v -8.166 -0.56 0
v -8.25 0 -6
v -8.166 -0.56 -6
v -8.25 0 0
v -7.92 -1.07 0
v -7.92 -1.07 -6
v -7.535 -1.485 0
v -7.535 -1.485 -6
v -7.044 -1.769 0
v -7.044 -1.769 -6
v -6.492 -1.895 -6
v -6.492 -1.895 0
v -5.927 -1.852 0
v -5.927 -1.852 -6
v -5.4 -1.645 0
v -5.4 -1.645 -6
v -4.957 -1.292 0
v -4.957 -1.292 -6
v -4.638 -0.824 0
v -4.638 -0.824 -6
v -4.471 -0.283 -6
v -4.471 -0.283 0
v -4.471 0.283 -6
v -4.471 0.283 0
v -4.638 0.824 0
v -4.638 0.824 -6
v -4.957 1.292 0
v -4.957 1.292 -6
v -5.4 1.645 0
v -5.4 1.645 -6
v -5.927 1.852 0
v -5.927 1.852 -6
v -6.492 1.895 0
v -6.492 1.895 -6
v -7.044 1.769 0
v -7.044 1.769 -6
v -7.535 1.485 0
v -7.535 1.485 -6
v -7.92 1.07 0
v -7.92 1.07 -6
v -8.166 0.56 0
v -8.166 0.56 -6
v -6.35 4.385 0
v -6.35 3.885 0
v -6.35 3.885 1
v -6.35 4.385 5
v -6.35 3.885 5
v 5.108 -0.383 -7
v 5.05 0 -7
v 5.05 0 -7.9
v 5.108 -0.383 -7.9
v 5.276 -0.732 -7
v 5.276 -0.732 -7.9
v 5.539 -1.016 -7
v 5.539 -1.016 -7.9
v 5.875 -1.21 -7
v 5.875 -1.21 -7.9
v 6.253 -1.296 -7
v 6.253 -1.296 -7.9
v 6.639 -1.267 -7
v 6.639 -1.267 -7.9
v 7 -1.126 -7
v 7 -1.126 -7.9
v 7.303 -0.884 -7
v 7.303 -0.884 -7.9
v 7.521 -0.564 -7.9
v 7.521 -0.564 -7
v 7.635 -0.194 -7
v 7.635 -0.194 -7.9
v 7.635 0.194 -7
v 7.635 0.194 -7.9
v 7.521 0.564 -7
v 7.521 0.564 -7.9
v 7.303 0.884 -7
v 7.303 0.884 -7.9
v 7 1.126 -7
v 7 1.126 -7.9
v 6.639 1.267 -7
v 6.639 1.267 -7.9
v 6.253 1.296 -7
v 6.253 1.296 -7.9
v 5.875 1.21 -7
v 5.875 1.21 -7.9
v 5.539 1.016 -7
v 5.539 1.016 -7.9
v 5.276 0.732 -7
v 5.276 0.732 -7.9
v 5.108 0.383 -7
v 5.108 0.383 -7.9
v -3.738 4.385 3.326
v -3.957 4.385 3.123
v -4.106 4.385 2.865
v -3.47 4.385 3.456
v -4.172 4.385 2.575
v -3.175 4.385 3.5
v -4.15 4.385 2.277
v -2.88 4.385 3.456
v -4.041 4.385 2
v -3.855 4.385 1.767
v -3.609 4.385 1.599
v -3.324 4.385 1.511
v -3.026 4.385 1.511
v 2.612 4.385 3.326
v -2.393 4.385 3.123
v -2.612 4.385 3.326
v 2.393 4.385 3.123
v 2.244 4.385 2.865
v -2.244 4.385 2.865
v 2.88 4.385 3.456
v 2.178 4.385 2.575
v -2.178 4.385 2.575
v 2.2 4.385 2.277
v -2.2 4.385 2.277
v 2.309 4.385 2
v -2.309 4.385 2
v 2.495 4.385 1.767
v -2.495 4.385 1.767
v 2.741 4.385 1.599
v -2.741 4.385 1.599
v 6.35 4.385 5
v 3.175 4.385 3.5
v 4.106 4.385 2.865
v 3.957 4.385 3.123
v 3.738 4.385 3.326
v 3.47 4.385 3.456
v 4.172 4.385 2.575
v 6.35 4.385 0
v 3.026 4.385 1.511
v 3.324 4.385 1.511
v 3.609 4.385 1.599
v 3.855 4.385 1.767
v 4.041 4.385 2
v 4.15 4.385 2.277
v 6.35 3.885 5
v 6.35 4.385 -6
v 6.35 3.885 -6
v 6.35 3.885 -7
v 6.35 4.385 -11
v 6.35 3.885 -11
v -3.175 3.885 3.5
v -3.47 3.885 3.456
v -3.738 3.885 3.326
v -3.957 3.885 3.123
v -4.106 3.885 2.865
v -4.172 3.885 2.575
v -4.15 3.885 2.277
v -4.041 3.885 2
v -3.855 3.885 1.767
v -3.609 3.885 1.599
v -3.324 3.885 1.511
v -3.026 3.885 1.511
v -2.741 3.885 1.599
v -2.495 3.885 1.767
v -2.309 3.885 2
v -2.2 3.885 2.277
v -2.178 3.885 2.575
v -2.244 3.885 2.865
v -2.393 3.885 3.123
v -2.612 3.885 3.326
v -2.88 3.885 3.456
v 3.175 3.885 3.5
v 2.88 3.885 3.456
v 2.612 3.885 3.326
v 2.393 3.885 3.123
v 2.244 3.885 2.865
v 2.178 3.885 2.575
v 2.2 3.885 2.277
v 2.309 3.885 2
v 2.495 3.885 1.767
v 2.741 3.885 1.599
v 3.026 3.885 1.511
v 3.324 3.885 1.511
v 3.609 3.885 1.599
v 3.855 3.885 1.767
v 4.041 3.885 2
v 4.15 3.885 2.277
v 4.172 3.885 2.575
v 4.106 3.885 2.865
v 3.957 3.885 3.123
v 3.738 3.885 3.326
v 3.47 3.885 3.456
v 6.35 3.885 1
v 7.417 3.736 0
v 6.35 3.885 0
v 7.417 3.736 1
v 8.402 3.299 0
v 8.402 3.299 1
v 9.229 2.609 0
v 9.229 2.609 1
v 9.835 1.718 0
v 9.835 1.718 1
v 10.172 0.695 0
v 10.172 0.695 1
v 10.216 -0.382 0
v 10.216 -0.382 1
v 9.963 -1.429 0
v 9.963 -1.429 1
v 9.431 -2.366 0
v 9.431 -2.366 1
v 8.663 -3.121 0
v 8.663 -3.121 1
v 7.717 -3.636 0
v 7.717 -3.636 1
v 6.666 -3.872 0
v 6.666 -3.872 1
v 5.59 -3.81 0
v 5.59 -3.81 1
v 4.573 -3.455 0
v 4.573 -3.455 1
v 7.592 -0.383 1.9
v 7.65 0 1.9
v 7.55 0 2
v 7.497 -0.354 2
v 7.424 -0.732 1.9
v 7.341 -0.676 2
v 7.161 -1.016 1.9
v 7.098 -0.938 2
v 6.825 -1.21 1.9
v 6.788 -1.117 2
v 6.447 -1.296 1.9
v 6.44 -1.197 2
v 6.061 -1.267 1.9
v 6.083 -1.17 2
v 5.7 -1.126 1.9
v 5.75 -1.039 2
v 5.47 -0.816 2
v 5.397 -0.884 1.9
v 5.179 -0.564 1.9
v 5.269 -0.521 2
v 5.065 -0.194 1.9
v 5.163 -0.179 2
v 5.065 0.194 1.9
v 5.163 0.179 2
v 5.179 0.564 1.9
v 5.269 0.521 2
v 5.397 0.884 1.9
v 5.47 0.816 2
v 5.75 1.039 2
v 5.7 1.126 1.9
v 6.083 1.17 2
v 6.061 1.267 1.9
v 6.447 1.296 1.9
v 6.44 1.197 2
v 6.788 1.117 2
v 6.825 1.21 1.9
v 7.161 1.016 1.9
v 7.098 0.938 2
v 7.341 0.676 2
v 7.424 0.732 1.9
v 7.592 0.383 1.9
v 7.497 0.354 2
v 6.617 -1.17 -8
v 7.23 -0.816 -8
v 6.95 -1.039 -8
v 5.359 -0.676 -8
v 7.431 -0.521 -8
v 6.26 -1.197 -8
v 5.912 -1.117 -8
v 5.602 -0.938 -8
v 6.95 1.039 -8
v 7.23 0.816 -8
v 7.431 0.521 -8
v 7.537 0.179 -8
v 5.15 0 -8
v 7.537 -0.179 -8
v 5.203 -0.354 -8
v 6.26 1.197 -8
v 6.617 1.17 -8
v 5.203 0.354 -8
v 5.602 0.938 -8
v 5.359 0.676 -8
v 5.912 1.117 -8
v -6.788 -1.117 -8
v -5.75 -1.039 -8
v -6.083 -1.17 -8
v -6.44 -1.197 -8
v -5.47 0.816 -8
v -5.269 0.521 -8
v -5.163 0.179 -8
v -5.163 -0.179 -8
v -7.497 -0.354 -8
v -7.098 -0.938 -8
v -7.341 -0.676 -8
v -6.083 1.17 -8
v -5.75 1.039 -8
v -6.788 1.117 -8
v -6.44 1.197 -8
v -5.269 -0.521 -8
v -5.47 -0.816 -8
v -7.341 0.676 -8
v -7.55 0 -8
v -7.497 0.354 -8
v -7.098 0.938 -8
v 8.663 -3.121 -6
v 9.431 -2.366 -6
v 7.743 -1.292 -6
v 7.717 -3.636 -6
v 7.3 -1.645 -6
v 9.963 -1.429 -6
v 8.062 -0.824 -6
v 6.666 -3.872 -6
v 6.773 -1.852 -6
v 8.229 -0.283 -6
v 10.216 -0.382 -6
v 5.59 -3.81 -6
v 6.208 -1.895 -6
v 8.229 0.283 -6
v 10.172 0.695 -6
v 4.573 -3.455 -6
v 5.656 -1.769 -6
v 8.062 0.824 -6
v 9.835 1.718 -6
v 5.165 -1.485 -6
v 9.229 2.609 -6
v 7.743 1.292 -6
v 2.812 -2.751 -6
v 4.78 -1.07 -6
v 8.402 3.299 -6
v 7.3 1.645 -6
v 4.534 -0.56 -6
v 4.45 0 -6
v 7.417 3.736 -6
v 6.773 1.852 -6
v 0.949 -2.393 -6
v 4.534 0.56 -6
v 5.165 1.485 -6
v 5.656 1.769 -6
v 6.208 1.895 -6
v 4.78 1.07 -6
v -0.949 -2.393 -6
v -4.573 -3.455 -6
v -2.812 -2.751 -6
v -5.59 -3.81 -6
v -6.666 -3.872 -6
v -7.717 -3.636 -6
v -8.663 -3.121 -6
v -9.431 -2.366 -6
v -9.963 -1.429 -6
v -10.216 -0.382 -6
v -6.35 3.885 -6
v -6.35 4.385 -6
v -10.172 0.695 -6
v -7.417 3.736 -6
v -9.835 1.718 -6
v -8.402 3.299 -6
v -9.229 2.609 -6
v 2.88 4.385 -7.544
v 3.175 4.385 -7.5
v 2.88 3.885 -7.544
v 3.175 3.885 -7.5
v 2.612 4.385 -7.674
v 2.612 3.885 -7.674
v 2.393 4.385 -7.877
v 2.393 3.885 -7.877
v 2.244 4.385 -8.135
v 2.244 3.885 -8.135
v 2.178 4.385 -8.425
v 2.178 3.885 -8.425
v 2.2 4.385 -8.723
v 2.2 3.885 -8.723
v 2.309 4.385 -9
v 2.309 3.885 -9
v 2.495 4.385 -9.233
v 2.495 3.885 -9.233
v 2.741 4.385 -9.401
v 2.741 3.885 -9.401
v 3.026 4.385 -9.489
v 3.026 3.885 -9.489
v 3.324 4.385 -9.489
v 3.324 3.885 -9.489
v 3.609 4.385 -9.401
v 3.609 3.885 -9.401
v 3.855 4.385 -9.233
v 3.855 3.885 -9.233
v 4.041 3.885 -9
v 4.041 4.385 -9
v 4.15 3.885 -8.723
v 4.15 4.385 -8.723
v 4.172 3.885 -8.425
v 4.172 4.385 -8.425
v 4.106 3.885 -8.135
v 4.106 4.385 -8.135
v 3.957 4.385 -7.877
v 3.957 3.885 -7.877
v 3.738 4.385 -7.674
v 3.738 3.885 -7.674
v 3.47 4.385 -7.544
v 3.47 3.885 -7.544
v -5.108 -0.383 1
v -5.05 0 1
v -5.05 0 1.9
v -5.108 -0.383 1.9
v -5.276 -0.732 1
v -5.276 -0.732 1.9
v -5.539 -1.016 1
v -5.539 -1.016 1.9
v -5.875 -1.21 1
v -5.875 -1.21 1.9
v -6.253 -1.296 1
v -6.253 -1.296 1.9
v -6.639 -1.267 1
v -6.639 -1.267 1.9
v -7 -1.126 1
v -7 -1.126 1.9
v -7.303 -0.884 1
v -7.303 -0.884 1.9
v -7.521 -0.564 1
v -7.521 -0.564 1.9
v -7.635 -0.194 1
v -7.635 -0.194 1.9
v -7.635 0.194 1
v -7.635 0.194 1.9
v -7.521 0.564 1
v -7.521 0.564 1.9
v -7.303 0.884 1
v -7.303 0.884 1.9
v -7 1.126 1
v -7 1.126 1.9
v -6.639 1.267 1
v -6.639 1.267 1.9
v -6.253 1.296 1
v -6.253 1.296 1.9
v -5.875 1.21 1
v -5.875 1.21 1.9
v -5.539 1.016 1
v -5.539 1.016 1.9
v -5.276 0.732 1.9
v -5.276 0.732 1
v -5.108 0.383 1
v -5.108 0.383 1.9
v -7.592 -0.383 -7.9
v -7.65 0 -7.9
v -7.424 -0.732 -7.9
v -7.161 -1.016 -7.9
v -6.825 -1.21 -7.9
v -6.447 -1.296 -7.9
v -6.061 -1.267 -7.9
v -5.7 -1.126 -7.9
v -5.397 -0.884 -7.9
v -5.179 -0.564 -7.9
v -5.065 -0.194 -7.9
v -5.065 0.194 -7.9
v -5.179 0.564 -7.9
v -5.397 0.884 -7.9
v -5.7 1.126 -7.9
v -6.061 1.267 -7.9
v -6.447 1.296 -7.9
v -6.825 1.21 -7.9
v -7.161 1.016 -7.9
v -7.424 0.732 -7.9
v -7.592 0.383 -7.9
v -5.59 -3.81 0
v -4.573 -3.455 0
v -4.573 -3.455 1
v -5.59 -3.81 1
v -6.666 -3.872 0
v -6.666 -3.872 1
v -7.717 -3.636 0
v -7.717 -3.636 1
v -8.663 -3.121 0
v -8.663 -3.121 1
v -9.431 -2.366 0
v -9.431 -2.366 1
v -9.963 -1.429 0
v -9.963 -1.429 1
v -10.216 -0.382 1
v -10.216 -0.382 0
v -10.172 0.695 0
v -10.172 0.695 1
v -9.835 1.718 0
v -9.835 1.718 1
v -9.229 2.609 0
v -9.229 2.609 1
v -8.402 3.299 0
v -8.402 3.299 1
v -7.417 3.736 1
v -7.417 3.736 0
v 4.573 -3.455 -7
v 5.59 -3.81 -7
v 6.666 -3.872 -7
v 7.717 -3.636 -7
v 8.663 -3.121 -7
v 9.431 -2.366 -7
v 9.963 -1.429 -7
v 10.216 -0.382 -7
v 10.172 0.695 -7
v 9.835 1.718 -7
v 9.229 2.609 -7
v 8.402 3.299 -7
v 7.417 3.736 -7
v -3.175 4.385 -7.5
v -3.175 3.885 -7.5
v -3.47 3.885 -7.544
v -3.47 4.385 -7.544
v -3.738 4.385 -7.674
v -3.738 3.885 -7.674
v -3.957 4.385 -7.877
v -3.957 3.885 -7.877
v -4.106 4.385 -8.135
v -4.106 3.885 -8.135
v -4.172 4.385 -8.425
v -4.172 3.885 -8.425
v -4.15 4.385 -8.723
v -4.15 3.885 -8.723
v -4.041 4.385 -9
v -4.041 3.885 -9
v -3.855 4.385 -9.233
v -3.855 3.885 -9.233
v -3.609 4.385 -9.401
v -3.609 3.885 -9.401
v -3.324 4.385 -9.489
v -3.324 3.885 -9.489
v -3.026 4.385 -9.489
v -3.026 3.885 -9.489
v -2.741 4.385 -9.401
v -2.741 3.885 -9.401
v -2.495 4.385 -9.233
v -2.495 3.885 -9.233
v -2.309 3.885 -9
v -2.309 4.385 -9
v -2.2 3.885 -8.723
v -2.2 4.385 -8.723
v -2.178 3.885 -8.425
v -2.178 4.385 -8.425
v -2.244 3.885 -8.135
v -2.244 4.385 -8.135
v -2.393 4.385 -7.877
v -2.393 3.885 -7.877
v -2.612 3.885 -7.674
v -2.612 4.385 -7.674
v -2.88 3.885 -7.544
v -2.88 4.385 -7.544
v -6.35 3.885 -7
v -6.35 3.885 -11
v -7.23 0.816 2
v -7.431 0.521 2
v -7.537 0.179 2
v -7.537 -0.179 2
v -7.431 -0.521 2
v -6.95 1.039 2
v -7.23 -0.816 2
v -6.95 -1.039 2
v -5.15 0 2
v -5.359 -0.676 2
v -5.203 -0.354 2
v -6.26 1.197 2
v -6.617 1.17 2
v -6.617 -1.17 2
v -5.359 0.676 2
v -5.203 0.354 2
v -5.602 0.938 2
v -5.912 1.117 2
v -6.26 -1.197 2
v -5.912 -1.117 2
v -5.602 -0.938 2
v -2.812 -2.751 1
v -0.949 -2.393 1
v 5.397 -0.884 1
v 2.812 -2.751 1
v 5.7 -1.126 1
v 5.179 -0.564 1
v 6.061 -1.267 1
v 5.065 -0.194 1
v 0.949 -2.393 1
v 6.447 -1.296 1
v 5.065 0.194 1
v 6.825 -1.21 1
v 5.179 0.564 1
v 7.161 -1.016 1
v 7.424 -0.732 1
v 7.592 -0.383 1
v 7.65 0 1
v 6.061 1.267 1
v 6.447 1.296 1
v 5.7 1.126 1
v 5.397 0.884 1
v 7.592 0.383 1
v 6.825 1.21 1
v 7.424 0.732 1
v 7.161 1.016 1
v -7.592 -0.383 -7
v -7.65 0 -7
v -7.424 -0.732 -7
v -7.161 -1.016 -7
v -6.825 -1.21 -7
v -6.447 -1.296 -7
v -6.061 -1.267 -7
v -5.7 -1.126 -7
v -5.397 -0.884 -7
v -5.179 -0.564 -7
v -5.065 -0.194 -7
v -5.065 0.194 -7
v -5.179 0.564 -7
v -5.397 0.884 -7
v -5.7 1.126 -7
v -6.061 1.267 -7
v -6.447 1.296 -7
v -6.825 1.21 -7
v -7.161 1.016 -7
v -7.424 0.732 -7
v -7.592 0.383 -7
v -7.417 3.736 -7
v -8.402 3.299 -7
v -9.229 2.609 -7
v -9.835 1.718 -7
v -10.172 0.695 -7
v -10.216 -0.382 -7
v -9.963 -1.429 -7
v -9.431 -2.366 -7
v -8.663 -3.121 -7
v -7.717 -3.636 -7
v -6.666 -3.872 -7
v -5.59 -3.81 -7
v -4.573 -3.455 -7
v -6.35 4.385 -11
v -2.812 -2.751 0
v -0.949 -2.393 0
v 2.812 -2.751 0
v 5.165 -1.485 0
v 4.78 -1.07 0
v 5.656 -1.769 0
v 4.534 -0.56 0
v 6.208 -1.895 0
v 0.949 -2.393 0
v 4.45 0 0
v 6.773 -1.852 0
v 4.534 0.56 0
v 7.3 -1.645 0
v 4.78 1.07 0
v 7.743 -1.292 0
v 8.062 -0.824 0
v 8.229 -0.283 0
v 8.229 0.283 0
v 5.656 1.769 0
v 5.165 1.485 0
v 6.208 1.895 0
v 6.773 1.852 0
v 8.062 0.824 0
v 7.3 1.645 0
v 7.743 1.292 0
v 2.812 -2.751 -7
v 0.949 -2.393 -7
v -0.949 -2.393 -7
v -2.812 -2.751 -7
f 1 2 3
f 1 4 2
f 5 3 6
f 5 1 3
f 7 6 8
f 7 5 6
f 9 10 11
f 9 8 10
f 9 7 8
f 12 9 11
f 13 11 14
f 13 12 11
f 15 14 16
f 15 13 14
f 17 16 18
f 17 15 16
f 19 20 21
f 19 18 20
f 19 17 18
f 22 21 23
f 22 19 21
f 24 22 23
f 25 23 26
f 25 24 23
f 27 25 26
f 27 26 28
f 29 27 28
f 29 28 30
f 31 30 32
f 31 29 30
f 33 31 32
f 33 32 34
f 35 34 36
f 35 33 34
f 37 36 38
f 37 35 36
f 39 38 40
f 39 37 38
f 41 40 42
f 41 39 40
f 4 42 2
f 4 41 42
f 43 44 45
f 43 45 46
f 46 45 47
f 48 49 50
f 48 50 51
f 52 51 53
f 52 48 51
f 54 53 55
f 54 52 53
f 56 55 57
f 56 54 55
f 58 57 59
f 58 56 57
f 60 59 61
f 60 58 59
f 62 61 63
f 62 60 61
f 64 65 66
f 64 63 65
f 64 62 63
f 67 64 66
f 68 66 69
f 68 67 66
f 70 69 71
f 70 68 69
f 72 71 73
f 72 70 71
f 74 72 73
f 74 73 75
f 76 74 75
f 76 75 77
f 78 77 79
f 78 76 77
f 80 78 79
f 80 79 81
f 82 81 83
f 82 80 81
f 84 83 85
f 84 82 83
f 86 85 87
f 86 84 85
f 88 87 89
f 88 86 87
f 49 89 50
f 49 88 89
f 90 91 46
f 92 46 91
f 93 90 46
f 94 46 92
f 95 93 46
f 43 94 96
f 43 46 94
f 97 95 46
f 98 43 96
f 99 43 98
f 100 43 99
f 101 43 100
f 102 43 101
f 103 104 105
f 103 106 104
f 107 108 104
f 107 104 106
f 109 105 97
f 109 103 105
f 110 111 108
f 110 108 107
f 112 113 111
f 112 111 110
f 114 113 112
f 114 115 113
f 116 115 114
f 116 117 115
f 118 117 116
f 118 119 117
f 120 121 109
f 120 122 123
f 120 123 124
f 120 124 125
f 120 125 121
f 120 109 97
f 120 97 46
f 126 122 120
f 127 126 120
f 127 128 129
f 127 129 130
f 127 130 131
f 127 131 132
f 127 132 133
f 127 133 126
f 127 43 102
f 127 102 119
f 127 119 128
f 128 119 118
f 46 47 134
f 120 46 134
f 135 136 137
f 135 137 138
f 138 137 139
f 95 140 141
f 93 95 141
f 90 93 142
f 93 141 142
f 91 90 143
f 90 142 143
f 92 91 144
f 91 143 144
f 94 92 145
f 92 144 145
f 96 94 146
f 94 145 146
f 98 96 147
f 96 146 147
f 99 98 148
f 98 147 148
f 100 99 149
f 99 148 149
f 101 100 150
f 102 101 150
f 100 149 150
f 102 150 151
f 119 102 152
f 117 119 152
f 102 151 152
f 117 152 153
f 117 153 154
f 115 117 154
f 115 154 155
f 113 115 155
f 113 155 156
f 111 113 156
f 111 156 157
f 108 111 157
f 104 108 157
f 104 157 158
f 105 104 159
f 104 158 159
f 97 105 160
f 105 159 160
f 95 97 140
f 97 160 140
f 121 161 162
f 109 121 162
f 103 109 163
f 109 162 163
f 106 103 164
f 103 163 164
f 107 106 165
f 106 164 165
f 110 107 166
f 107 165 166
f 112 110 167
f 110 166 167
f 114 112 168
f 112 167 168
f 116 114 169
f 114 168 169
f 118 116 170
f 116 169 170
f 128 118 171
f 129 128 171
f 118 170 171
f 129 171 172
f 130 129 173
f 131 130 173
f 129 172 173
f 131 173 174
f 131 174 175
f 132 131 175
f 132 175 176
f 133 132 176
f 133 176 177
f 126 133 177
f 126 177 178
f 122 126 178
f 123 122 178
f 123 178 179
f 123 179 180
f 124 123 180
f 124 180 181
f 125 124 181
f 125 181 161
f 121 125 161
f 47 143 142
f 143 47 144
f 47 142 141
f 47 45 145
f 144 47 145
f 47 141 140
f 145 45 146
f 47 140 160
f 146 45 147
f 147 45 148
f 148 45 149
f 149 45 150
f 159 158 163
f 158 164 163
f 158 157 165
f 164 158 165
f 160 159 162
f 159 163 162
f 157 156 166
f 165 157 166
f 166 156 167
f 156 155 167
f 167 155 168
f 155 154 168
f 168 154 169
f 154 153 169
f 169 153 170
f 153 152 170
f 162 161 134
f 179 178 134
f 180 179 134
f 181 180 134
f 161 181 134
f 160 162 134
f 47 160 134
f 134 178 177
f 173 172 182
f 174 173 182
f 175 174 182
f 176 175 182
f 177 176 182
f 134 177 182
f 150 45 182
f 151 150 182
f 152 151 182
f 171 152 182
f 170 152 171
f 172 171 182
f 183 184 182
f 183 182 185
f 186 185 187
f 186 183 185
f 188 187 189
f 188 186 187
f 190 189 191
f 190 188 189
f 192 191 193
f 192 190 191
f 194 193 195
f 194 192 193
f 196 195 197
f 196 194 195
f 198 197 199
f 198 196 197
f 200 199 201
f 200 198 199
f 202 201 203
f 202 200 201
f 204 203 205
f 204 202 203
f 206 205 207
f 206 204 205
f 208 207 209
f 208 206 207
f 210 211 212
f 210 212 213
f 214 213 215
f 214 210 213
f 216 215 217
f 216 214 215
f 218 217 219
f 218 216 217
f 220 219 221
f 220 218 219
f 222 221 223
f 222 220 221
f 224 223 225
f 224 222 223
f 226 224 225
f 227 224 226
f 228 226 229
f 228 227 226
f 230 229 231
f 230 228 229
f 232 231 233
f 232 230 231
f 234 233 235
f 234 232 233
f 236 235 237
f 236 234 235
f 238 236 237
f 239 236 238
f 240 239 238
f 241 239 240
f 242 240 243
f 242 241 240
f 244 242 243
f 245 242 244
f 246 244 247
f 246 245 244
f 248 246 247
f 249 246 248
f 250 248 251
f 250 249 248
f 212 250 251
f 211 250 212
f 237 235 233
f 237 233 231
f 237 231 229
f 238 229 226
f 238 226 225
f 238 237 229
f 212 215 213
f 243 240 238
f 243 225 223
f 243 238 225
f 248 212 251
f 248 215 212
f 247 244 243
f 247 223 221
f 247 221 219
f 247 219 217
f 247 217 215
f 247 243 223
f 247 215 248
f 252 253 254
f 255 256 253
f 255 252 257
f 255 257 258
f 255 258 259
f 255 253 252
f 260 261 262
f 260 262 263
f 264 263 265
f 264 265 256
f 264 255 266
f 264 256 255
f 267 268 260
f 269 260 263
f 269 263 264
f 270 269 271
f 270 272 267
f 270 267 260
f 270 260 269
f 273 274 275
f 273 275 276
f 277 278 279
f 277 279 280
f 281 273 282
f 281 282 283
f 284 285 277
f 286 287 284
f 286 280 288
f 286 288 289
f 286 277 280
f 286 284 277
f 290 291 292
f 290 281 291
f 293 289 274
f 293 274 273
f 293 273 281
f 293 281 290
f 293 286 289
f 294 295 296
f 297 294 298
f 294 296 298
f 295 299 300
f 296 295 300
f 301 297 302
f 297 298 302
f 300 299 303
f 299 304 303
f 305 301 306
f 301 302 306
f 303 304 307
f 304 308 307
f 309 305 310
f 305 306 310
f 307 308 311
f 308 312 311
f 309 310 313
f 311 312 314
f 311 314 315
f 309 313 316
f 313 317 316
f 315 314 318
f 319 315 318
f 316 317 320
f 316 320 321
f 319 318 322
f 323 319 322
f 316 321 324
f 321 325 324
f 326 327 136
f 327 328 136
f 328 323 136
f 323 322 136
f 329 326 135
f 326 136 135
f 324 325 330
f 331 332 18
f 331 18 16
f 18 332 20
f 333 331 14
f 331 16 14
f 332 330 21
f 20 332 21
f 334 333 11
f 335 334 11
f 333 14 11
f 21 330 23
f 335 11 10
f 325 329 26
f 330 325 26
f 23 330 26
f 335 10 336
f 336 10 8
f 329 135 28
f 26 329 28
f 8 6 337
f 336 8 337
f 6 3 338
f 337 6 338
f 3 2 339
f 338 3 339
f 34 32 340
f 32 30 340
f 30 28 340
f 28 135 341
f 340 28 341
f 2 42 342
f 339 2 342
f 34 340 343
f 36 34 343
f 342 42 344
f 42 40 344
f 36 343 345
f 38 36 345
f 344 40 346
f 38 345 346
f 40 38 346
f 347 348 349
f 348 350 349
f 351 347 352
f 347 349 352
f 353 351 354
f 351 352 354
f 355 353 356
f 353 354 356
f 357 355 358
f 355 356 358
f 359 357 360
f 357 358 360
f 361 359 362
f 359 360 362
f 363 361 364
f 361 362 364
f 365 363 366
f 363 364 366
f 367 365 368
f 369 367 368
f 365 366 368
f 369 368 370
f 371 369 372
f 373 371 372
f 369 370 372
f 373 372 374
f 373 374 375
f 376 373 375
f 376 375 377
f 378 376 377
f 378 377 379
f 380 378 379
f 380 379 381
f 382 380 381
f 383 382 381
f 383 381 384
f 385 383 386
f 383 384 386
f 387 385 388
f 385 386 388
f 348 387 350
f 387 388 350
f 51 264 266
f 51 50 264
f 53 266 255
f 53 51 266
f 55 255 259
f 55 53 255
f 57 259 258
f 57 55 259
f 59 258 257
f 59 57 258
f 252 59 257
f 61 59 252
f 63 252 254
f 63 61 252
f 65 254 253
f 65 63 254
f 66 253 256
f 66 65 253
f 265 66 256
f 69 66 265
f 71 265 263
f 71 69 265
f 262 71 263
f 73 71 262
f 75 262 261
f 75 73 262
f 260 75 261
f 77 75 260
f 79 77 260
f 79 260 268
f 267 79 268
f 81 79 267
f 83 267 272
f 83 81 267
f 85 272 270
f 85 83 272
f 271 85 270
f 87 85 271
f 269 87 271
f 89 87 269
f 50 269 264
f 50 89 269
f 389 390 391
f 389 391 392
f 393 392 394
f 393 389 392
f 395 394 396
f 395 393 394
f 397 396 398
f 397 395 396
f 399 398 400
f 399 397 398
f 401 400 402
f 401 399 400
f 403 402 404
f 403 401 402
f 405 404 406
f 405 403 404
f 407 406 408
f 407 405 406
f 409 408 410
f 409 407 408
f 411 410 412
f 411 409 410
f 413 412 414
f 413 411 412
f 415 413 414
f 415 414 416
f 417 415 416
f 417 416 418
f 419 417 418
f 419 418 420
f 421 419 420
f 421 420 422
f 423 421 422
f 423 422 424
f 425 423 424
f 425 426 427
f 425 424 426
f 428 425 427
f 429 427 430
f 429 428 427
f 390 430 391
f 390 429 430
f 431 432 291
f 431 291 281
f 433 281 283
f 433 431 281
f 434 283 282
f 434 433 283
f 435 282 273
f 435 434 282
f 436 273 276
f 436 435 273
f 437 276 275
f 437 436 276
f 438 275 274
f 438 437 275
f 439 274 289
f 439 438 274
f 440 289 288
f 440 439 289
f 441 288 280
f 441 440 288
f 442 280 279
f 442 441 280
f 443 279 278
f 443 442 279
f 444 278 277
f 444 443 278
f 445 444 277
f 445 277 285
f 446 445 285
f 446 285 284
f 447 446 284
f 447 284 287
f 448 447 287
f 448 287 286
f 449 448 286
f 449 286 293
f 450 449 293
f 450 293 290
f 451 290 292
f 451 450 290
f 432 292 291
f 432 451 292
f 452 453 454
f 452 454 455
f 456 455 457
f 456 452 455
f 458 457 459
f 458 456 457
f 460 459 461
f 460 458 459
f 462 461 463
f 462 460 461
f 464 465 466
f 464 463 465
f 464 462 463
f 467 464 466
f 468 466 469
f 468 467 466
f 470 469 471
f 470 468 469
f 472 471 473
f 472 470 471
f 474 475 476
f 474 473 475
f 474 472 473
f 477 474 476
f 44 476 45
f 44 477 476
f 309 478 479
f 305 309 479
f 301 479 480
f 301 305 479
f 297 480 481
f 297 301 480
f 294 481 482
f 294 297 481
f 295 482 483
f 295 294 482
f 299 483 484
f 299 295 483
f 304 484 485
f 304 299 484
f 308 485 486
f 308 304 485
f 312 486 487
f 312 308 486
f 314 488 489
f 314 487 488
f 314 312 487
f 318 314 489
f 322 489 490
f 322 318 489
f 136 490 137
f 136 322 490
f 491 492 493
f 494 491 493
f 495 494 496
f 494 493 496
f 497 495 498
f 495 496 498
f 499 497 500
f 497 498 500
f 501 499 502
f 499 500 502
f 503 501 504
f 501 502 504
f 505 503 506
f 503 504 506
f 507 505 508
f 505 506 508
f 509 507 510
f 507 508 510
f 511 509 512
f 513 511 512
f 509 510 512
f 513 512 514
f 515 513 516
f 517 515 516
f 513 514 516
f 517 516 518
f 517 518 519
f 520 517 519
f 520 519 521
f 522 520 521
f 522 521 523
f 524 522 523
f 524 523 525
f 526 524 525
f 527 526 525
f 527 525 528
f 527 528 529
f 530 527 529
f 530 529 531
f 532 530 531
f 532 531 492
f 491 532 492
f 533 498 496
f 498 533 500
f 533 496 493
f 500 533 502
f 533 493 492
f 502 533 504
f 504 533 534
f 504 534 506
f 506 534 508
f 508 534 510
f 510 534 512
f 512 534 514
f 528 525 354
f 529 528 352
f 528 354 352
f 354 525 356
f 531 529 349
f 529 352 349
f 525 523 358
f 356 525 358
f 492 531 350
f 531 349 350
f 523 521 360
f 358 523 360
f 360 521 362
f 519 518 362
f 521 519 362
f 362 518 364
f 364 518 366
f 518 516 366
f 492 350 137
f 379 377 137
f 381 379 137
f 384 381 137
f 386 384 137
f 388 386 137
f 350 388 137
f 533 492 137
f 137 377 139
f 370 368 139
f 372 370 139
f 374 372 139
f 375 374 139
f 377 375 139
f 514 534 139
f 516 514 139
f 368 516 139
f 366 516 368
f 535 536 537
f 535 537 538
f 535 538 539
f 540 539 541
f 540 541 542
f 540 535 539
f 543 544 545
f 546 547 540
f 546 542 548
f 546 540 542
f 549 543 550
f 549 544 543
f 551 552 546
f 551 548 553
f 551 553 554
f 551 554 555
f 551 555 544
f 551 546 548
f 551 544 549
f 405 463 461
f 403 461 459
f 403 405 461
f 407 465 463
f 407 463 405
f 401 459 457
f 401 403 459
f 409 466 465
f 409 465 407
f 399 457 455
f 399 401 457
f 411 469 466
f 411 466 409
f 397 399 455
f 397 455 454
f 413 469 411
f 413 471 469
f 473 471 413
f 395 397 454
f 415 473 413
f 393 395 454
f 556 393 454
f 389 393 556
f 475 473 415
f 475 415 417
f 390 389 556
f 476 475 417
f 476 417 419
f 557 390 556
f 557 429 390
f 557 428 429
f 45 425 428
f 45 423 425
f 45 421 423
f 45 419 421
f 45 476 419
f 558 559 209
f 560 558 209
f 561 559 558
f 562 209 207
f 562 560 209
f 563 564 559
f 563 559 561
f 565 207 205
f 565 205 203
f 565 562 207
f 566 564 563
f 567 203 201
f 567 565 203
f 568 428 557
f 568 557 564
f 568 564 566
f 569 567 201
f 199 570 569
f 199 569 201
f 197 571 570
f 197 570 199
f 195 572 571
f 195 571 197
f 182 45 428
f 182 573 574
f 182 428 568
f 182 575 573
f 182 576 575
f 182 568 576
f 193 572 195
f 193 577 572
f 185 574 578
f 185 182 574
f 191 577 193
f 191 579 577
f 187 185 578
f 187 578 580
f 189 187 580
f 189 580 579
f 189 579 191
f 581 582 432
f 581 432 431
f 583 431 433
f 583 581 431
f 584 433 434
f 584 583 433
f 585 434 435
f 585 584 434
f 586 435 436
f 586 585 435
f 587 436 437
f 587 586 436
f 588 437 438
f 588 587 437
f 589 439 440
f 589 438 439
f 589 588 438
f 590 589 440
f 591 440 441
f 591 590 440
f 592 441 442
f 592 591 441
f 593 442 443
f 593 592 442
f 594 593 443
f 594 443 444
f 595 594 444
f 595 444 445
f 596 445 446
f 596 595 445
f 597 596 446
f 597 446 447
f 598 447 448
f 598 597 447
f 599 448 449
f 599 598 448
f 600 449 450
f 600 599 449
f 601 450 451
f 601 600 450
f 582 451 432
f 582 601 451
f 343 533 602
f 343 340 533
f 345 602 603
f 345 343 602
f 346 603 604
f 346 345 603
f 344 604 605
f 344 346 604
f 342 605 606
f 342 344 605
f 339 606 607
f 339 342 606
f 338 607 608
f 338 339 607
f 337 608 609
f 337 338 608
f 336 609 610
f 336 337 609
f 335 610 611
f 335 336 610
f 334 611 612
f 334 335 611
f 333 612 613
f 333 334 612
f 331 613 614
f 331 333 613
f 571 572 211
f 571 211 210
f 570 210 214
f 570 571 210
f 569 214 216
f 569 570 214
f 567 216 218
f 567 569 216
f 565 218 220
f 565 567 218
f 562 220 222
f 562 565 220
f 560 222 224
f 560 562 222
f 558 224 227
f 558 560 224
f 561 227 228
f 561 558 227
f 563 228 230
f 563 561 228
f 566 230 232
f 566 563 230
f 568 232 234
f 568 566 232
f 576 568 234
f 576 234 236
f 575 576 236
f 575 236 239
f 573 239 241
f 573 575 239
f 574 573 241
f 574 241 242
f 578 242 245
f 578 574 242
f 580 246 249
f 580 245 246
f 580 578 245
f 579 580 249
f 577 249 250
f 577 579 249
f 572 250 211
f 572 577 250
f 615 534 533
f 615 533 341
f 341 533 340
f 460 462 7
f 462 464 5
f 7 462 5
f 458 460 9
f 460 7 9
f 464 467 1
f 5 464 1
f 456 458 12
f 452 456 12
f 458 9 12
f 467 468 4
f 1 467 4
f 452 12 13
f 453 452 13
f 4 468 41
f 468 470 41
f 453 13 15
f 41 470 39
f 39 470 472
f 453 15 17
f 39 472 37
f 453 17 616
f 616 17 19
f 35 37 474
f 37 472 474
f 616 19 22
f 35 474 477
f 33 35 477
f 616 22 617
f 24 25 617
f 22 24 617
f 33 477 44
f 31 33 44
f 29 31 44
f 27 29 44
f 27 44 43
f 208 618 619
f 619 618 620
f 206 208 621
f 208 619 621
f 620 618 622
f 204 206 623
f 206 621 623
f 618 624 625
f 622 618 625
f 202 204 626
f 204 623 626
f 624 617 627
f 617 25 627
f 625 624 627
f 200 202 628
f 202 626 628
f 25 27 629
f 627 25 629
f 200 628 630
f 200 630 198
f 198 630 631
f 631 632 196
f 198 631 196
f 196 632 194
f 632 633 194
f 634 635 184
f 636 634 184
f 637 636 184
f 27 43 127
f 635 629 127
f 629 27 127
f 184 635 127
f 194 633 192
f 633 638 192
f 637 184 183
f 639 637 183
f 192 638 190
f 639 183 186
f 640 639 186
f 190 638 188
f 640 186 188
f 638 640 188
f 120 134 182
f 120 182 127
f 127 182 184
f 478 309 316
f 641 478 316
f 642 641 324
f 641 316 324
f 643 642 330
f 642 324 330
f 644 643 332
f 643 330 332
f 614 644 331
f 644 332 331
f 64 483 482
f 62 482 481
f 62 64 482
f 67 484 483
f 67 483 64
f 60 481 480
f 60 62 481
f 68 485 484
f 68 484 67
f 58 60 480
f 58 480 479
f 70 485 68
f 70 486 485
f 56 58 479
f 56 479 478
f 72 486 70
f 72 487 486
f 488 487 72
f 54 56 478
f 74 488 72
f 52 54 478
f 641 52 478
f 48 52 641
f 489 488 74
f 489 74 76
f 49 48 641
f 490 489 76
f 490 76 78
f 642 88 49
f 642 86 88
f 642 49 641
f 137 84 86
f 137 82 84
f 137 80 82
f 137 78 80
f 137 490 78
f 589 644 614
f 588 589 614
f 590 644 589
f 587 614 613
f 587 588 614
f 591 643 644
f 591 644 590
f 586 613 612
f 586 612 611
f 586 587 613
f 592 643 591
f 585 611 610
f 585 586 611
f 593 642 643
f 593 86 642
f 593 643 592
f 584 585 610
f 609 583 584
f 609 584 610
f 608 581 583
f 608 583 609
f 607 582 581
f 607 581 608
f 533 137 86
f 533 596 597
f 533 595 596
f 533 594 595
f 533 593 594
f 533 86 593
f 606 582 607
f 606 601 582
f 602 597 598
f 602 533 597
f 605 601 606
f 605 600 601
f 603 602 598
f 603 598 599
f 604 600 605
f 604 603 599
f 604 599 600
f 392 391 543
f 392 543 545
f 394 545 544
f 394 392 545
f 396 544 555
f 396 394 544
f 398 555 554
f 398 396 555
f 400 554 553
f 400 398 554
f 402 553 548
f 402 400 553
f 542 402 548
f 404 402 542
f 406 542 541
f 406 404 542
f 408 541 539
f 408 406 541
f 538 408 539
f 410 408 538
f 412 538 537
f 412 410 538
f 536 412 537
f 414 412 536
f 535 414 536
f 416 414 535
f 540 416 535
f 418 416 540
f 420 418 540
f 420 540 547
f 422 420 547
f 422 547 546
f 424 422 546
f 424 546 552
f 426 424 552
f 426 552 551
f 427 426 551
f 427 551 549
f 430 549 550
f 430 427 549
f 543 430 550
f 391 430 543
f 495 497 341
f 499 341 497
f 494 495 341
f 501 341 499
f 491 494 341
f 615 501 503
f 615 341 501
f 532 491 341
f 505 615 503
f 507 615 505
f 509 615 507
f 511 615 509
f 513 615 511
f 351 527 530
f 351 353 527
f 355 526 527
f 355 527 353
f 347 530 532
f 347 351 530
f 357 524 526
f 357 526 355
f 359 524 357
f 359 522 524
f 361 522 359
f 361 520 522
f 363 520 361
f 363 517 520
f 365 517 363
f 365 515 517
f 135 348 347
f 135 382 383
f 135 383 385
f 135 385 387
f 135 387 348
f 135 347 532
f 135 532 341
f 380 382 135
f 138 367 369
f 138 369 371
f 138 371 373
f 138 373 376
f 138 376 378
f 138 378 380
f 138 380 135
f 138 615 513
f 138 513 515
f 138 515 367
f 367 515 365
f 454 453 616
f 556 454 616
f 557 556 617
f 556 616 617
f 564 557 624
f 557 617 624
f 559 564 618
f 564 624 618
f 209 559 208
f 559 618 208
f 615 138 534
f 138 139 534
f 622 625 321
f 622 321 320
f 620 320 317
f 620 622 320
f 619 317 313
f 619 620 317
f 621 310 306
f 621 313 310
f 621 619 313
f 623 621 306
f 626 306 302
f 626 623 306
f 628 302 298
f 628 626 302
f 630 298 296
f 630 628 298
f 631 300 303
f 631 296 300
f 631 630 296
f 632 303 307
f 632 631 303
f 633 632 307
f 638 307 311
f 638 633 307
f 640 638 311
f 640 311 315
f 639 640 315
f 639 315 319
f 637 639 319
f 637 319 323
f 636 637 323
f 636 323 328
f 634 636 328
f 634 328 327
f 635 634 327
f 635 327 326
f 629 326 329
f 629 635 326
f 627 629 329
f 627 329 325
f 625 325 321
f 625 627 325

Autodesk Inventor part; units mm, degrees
ref_plane "YZ Plane" through (0, 0, 0) normal (1, 0, 0) x (0, 1, 0)
ref_plane "XZ Plane" through (0, 0, 0) normal (0, 1, 0) x (-1, 0, 0)
sketch "Sketch1" plane through (0, 0, 0) normal (0, 0, 1) x (1, 0, 0)
  circle A0 centre (-6.35, 0) radius 3.885
  circle A1 centre (6.35, 0) radius 3.885
  arc A2 (4.5733, -3.4549) -> (-4.5733, -3.4549) centre (0, -12.3479) ccw
  line L0 (-6.35, 3.885) -> (6.35, 3.885)
  point P0 (0, 0)
  dimension "d0" = 7.77
  dimension "d1" = 6.35
  dimension "d2" = 7.77
  dimension "d3" = 6.35
  dimension "d5" = 0
  dimension "d6" = 0
  dimension "d7" = 20
extrude "Extrusion1" add sketch "Sketch1" along normal blind 1
sketch "Sketch2" plane through (0, 0, 0) normal (0, 0, -1) x (-1, 0, 0)
  arc A0 (-6.35, 3.885) -> (-4.5733, -3.4549) centre (-6.35, 0) ccw projected
  arc A1 (4.5733, -3.4549) -> (6.35, 3.885) centre (6.35, 0) ccw projected
  circle A2 centre (-6.35, 0) radius 1.9
  circle A3 centre (6.35, 0) radius 1.9
  point P0 (4.5733, 3.4549)
  point P1 (-4.5733, 3.4549)
  point P2 (0, 0)
  dimension "d10" = 3.8
  dimension "d11" = 3.8
extrude "Extrusion2" add sketch "Sketch2" along normal blind 6
sketch "Sketch3" plane through (-6.35, 0, -6) normal (0, 0, -1) x (-1, 0, 0)
  circle A0 centre (-12.7, 0) radius 1.9 projected
  circle A1 centre (0, 0) radius 1.9 projected
  arc A2 (-12.7, 3.885) -> (-10.9233, -3.4549) centre (-12.7, 0) ccw projected
  arc A3 (-1.7767, -3.4549) -> (-10.9233, -3.4549) centre (-6.35, -12.3479) ccw projected
  arc A4 (-1.7767, -3.4549) -> (0, 3.885) centre (0, 0) ccw projected
  line L0 (-12.7, 3.885) -> (0, 3.885) projected
  point P0 (-6.35, 0)
extrude "Extrusion3" add sketch "Sketch3" along normal blind 1 contours A0 | A1 | L0 A4 A3 A2
sketch "Sketch4" plane through (0, 0, 1) normal (0, 0, 1) x (1, 0, 0)
  arc A0 (-6.35, 3.885) -> (-4.5733, -3.4549) centre (-6.35, 0) ccw projected
  arc A1 (4.5733, -3.4549) -> (6.35, 3.885) centre (6.35, 0) ccw projected
  circle A2 centre (-6.35, 0) radius 1.3
  circle A3 centre (6.35, 0) radius 1.3
  point P0 (4.5733, 3.4549)
  point P1 (-4.5733, 3.4549)
  point P2 (0, 0)
  dimension "d16" = 2.6
  dimension "d17" = 2.6
extrude "Extrusion4" add sketch "Sketch4" along normal blind 1
sketch "Sketch5" plane through (-6.35, 0, -7) normal (0, 0, -1) x (-1, 0, 0)
  arc A0 (-12.7, 3.885) -> (-10.9233, -3.4549) centre (-12.7, 0) ccw projected
  arc A1 (-1.7767, -3.4549) -> (0, 3.885) centre (0, 0) ccw projected
  circle A2 centre (-12.7, 0) radius 1.3
  circle A3 centre (0, 0) radius 1.3
  point P0 (-1.7767, 3.4549)
  point P1 (-10.9233, 3.4549)
  point P2 (-6.35, 0)
  dimension "d20" = 2.6
  dimension "d21" = 2.6
extrude "Extrusion5" add sketch "Sketch5" along normal blind 1
chamfer "Chamfer1" distance 0.1 angle 45 2 edges at (7.65, 0, -8) (-5.05, 0, -8)
chamfer "Chamfer2" distance 0.1 angle 45 2 edges at (5.05, 0, 2) (-7.65, 0, 2)
ref_plane "Work Plane1" through (0, 0, -3) normal (0, 0, 1) x (1, 0, 0)
sketch "Skizze6" plane through (-6.35, 3.885, -6) normal (0, 1, 0) x (1, 0, 0)
  point P0 (6.35, -6)
sketch "Skizze7" plane through (-6.35, 3.885, 0) normal (0, 1, 0) x (1, 0, 0)
  line L0 (12.7, 0) -> (0, 0)
  line L1 (0, 0) -> (0, -5)
  line L2 (0, -5) -> (12.7, -5)
  line L3 (12.7, -5) -> (12.7, 0)
  line L4 (1.9, 6) -> (-1.9, 6) projected
  line L5 (0, 6) -> (12.7, 6)
  line L6 (12.7, 6) -> (12.7, 11)
  line L7 (12.7, 11) -> (0, 11)
  line L8 (0, 11) -> (0, 6)
  point P0 (6.35, 0)
  dimension "d31" = 5
  dimension "d33" = 5
extrude "Extrusion6" add sketch "Skizze7" along normal blind 0.5
sketch "Skizze8" plane through (-6.35, 4.385, 0) normal (0, 1, 0) x (1, 0, 0)
  line L0 (6.35, 0) -> (6.35, -2.5)
  line L1 (6.35, -2.5) -> (3.175, -2.5)
  line L2 (6.35, -2.5) -> (9.525, -2.5)
  line L3 (10.9233, 6) -> (1.7767, 6) projected
  line L4 (6.35, 6) -> (6.35, 8.5)
  line L5 (6.35, 8.5) -> (3.175, 8.5)
  line L6 (6.35, 8.5) -> (9.525, 8.5)
  dimension "d36" = 2.5
  dimension "d37" = 3.175
  dimension "d38" = 3.175
  dimension "d39" = 2.5
  dimension "d40" = 3.175
  dimension "d41" = 3.175
hole "Bohrung1" at (-3.175, 4.385, 2.5) at (3.175, 4.385, 2.5) at (-3.175, 4.385, -8.5) at (3.175, 4.385, -8.5) direction (0, -1, 0) diameter 2 end through all
equation "\"d2\" = d0"
equation "\"d3\" = d1"
equation "\"d7\" = d4"
equation "\"d11\" = d10"
equation "\"d17\" = d16"
equation "\"d20\" = d16"
equation "\"d21\" = d16"
equation "\"d4\" = 20"
properties part number "ConnectingLinks"
